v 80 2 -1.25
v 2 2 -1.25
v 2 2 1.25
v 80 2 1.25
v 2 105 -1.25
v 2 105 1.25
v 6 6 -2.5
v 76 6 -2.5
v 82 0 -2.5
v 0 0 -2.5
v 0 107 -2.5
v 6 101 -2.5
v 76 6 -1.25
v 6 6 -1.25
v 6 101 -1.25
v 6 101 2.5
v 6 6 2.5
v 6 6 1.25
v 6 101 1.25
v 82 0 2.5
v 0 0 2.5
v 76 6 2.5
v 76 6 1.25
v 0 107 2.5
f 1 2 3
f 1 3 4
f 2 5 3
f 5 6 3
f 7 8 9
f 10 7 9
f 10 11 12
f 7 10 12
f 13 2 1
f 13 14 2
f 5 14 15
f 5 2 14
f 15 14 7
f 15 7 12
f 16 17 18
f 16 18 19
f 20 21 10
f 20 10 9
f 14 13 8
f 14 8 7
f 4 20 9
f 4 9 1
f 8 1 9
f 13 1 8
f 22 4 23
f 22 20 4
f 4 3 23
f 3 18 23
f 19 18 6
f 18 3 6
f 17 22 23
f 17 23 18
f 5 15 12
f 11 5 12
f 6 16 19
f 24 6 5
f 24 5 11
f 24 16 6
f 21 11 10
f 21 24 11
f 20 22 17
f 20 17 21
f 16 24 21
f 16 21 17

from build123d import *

# Parameters (mm, degrees)
F1_DEPTH      = 2.5
F1_DEPTH_BACK = 2.5
F2_DEPTH      = 1.25
F2_DEPTH_BACK = 1.25


with BuildPart() as f1:
    # F0 (on Top) → F1 (new body, two sides)
    with BuildSketch(Plane.XY) as f1_sk:
        Polygon((0, 107), (0, 0), (82, 0), (80, 2), (2, 2), (2, 105), align=None)
        Polygon((6, 101), (2, 105), (2, 2), (80, 2), (76, 6), (6, 6), align=None)
    extrude(amount=F1_DEPTH)
    extrude(f1_sk.sketch, amount=-F1_DEPTH_BACK)

    # F0 (on Top) → F2 (cut, two sides)
    with BuildSketch(Plane.XY) as f2_sk:
        Polygon((6, 101), (2, 105), (2, 2), (80, 2), (76, 6), (6, 6), align=None)
    extrude(amount=-F2_DEPTH, mode=Mode.SUBTRACT)
    extrude(f2_sk.sketch, amount=F2_DEPTH_BACK, mode=Mode.SUBTRACT)


solid = f1.part
